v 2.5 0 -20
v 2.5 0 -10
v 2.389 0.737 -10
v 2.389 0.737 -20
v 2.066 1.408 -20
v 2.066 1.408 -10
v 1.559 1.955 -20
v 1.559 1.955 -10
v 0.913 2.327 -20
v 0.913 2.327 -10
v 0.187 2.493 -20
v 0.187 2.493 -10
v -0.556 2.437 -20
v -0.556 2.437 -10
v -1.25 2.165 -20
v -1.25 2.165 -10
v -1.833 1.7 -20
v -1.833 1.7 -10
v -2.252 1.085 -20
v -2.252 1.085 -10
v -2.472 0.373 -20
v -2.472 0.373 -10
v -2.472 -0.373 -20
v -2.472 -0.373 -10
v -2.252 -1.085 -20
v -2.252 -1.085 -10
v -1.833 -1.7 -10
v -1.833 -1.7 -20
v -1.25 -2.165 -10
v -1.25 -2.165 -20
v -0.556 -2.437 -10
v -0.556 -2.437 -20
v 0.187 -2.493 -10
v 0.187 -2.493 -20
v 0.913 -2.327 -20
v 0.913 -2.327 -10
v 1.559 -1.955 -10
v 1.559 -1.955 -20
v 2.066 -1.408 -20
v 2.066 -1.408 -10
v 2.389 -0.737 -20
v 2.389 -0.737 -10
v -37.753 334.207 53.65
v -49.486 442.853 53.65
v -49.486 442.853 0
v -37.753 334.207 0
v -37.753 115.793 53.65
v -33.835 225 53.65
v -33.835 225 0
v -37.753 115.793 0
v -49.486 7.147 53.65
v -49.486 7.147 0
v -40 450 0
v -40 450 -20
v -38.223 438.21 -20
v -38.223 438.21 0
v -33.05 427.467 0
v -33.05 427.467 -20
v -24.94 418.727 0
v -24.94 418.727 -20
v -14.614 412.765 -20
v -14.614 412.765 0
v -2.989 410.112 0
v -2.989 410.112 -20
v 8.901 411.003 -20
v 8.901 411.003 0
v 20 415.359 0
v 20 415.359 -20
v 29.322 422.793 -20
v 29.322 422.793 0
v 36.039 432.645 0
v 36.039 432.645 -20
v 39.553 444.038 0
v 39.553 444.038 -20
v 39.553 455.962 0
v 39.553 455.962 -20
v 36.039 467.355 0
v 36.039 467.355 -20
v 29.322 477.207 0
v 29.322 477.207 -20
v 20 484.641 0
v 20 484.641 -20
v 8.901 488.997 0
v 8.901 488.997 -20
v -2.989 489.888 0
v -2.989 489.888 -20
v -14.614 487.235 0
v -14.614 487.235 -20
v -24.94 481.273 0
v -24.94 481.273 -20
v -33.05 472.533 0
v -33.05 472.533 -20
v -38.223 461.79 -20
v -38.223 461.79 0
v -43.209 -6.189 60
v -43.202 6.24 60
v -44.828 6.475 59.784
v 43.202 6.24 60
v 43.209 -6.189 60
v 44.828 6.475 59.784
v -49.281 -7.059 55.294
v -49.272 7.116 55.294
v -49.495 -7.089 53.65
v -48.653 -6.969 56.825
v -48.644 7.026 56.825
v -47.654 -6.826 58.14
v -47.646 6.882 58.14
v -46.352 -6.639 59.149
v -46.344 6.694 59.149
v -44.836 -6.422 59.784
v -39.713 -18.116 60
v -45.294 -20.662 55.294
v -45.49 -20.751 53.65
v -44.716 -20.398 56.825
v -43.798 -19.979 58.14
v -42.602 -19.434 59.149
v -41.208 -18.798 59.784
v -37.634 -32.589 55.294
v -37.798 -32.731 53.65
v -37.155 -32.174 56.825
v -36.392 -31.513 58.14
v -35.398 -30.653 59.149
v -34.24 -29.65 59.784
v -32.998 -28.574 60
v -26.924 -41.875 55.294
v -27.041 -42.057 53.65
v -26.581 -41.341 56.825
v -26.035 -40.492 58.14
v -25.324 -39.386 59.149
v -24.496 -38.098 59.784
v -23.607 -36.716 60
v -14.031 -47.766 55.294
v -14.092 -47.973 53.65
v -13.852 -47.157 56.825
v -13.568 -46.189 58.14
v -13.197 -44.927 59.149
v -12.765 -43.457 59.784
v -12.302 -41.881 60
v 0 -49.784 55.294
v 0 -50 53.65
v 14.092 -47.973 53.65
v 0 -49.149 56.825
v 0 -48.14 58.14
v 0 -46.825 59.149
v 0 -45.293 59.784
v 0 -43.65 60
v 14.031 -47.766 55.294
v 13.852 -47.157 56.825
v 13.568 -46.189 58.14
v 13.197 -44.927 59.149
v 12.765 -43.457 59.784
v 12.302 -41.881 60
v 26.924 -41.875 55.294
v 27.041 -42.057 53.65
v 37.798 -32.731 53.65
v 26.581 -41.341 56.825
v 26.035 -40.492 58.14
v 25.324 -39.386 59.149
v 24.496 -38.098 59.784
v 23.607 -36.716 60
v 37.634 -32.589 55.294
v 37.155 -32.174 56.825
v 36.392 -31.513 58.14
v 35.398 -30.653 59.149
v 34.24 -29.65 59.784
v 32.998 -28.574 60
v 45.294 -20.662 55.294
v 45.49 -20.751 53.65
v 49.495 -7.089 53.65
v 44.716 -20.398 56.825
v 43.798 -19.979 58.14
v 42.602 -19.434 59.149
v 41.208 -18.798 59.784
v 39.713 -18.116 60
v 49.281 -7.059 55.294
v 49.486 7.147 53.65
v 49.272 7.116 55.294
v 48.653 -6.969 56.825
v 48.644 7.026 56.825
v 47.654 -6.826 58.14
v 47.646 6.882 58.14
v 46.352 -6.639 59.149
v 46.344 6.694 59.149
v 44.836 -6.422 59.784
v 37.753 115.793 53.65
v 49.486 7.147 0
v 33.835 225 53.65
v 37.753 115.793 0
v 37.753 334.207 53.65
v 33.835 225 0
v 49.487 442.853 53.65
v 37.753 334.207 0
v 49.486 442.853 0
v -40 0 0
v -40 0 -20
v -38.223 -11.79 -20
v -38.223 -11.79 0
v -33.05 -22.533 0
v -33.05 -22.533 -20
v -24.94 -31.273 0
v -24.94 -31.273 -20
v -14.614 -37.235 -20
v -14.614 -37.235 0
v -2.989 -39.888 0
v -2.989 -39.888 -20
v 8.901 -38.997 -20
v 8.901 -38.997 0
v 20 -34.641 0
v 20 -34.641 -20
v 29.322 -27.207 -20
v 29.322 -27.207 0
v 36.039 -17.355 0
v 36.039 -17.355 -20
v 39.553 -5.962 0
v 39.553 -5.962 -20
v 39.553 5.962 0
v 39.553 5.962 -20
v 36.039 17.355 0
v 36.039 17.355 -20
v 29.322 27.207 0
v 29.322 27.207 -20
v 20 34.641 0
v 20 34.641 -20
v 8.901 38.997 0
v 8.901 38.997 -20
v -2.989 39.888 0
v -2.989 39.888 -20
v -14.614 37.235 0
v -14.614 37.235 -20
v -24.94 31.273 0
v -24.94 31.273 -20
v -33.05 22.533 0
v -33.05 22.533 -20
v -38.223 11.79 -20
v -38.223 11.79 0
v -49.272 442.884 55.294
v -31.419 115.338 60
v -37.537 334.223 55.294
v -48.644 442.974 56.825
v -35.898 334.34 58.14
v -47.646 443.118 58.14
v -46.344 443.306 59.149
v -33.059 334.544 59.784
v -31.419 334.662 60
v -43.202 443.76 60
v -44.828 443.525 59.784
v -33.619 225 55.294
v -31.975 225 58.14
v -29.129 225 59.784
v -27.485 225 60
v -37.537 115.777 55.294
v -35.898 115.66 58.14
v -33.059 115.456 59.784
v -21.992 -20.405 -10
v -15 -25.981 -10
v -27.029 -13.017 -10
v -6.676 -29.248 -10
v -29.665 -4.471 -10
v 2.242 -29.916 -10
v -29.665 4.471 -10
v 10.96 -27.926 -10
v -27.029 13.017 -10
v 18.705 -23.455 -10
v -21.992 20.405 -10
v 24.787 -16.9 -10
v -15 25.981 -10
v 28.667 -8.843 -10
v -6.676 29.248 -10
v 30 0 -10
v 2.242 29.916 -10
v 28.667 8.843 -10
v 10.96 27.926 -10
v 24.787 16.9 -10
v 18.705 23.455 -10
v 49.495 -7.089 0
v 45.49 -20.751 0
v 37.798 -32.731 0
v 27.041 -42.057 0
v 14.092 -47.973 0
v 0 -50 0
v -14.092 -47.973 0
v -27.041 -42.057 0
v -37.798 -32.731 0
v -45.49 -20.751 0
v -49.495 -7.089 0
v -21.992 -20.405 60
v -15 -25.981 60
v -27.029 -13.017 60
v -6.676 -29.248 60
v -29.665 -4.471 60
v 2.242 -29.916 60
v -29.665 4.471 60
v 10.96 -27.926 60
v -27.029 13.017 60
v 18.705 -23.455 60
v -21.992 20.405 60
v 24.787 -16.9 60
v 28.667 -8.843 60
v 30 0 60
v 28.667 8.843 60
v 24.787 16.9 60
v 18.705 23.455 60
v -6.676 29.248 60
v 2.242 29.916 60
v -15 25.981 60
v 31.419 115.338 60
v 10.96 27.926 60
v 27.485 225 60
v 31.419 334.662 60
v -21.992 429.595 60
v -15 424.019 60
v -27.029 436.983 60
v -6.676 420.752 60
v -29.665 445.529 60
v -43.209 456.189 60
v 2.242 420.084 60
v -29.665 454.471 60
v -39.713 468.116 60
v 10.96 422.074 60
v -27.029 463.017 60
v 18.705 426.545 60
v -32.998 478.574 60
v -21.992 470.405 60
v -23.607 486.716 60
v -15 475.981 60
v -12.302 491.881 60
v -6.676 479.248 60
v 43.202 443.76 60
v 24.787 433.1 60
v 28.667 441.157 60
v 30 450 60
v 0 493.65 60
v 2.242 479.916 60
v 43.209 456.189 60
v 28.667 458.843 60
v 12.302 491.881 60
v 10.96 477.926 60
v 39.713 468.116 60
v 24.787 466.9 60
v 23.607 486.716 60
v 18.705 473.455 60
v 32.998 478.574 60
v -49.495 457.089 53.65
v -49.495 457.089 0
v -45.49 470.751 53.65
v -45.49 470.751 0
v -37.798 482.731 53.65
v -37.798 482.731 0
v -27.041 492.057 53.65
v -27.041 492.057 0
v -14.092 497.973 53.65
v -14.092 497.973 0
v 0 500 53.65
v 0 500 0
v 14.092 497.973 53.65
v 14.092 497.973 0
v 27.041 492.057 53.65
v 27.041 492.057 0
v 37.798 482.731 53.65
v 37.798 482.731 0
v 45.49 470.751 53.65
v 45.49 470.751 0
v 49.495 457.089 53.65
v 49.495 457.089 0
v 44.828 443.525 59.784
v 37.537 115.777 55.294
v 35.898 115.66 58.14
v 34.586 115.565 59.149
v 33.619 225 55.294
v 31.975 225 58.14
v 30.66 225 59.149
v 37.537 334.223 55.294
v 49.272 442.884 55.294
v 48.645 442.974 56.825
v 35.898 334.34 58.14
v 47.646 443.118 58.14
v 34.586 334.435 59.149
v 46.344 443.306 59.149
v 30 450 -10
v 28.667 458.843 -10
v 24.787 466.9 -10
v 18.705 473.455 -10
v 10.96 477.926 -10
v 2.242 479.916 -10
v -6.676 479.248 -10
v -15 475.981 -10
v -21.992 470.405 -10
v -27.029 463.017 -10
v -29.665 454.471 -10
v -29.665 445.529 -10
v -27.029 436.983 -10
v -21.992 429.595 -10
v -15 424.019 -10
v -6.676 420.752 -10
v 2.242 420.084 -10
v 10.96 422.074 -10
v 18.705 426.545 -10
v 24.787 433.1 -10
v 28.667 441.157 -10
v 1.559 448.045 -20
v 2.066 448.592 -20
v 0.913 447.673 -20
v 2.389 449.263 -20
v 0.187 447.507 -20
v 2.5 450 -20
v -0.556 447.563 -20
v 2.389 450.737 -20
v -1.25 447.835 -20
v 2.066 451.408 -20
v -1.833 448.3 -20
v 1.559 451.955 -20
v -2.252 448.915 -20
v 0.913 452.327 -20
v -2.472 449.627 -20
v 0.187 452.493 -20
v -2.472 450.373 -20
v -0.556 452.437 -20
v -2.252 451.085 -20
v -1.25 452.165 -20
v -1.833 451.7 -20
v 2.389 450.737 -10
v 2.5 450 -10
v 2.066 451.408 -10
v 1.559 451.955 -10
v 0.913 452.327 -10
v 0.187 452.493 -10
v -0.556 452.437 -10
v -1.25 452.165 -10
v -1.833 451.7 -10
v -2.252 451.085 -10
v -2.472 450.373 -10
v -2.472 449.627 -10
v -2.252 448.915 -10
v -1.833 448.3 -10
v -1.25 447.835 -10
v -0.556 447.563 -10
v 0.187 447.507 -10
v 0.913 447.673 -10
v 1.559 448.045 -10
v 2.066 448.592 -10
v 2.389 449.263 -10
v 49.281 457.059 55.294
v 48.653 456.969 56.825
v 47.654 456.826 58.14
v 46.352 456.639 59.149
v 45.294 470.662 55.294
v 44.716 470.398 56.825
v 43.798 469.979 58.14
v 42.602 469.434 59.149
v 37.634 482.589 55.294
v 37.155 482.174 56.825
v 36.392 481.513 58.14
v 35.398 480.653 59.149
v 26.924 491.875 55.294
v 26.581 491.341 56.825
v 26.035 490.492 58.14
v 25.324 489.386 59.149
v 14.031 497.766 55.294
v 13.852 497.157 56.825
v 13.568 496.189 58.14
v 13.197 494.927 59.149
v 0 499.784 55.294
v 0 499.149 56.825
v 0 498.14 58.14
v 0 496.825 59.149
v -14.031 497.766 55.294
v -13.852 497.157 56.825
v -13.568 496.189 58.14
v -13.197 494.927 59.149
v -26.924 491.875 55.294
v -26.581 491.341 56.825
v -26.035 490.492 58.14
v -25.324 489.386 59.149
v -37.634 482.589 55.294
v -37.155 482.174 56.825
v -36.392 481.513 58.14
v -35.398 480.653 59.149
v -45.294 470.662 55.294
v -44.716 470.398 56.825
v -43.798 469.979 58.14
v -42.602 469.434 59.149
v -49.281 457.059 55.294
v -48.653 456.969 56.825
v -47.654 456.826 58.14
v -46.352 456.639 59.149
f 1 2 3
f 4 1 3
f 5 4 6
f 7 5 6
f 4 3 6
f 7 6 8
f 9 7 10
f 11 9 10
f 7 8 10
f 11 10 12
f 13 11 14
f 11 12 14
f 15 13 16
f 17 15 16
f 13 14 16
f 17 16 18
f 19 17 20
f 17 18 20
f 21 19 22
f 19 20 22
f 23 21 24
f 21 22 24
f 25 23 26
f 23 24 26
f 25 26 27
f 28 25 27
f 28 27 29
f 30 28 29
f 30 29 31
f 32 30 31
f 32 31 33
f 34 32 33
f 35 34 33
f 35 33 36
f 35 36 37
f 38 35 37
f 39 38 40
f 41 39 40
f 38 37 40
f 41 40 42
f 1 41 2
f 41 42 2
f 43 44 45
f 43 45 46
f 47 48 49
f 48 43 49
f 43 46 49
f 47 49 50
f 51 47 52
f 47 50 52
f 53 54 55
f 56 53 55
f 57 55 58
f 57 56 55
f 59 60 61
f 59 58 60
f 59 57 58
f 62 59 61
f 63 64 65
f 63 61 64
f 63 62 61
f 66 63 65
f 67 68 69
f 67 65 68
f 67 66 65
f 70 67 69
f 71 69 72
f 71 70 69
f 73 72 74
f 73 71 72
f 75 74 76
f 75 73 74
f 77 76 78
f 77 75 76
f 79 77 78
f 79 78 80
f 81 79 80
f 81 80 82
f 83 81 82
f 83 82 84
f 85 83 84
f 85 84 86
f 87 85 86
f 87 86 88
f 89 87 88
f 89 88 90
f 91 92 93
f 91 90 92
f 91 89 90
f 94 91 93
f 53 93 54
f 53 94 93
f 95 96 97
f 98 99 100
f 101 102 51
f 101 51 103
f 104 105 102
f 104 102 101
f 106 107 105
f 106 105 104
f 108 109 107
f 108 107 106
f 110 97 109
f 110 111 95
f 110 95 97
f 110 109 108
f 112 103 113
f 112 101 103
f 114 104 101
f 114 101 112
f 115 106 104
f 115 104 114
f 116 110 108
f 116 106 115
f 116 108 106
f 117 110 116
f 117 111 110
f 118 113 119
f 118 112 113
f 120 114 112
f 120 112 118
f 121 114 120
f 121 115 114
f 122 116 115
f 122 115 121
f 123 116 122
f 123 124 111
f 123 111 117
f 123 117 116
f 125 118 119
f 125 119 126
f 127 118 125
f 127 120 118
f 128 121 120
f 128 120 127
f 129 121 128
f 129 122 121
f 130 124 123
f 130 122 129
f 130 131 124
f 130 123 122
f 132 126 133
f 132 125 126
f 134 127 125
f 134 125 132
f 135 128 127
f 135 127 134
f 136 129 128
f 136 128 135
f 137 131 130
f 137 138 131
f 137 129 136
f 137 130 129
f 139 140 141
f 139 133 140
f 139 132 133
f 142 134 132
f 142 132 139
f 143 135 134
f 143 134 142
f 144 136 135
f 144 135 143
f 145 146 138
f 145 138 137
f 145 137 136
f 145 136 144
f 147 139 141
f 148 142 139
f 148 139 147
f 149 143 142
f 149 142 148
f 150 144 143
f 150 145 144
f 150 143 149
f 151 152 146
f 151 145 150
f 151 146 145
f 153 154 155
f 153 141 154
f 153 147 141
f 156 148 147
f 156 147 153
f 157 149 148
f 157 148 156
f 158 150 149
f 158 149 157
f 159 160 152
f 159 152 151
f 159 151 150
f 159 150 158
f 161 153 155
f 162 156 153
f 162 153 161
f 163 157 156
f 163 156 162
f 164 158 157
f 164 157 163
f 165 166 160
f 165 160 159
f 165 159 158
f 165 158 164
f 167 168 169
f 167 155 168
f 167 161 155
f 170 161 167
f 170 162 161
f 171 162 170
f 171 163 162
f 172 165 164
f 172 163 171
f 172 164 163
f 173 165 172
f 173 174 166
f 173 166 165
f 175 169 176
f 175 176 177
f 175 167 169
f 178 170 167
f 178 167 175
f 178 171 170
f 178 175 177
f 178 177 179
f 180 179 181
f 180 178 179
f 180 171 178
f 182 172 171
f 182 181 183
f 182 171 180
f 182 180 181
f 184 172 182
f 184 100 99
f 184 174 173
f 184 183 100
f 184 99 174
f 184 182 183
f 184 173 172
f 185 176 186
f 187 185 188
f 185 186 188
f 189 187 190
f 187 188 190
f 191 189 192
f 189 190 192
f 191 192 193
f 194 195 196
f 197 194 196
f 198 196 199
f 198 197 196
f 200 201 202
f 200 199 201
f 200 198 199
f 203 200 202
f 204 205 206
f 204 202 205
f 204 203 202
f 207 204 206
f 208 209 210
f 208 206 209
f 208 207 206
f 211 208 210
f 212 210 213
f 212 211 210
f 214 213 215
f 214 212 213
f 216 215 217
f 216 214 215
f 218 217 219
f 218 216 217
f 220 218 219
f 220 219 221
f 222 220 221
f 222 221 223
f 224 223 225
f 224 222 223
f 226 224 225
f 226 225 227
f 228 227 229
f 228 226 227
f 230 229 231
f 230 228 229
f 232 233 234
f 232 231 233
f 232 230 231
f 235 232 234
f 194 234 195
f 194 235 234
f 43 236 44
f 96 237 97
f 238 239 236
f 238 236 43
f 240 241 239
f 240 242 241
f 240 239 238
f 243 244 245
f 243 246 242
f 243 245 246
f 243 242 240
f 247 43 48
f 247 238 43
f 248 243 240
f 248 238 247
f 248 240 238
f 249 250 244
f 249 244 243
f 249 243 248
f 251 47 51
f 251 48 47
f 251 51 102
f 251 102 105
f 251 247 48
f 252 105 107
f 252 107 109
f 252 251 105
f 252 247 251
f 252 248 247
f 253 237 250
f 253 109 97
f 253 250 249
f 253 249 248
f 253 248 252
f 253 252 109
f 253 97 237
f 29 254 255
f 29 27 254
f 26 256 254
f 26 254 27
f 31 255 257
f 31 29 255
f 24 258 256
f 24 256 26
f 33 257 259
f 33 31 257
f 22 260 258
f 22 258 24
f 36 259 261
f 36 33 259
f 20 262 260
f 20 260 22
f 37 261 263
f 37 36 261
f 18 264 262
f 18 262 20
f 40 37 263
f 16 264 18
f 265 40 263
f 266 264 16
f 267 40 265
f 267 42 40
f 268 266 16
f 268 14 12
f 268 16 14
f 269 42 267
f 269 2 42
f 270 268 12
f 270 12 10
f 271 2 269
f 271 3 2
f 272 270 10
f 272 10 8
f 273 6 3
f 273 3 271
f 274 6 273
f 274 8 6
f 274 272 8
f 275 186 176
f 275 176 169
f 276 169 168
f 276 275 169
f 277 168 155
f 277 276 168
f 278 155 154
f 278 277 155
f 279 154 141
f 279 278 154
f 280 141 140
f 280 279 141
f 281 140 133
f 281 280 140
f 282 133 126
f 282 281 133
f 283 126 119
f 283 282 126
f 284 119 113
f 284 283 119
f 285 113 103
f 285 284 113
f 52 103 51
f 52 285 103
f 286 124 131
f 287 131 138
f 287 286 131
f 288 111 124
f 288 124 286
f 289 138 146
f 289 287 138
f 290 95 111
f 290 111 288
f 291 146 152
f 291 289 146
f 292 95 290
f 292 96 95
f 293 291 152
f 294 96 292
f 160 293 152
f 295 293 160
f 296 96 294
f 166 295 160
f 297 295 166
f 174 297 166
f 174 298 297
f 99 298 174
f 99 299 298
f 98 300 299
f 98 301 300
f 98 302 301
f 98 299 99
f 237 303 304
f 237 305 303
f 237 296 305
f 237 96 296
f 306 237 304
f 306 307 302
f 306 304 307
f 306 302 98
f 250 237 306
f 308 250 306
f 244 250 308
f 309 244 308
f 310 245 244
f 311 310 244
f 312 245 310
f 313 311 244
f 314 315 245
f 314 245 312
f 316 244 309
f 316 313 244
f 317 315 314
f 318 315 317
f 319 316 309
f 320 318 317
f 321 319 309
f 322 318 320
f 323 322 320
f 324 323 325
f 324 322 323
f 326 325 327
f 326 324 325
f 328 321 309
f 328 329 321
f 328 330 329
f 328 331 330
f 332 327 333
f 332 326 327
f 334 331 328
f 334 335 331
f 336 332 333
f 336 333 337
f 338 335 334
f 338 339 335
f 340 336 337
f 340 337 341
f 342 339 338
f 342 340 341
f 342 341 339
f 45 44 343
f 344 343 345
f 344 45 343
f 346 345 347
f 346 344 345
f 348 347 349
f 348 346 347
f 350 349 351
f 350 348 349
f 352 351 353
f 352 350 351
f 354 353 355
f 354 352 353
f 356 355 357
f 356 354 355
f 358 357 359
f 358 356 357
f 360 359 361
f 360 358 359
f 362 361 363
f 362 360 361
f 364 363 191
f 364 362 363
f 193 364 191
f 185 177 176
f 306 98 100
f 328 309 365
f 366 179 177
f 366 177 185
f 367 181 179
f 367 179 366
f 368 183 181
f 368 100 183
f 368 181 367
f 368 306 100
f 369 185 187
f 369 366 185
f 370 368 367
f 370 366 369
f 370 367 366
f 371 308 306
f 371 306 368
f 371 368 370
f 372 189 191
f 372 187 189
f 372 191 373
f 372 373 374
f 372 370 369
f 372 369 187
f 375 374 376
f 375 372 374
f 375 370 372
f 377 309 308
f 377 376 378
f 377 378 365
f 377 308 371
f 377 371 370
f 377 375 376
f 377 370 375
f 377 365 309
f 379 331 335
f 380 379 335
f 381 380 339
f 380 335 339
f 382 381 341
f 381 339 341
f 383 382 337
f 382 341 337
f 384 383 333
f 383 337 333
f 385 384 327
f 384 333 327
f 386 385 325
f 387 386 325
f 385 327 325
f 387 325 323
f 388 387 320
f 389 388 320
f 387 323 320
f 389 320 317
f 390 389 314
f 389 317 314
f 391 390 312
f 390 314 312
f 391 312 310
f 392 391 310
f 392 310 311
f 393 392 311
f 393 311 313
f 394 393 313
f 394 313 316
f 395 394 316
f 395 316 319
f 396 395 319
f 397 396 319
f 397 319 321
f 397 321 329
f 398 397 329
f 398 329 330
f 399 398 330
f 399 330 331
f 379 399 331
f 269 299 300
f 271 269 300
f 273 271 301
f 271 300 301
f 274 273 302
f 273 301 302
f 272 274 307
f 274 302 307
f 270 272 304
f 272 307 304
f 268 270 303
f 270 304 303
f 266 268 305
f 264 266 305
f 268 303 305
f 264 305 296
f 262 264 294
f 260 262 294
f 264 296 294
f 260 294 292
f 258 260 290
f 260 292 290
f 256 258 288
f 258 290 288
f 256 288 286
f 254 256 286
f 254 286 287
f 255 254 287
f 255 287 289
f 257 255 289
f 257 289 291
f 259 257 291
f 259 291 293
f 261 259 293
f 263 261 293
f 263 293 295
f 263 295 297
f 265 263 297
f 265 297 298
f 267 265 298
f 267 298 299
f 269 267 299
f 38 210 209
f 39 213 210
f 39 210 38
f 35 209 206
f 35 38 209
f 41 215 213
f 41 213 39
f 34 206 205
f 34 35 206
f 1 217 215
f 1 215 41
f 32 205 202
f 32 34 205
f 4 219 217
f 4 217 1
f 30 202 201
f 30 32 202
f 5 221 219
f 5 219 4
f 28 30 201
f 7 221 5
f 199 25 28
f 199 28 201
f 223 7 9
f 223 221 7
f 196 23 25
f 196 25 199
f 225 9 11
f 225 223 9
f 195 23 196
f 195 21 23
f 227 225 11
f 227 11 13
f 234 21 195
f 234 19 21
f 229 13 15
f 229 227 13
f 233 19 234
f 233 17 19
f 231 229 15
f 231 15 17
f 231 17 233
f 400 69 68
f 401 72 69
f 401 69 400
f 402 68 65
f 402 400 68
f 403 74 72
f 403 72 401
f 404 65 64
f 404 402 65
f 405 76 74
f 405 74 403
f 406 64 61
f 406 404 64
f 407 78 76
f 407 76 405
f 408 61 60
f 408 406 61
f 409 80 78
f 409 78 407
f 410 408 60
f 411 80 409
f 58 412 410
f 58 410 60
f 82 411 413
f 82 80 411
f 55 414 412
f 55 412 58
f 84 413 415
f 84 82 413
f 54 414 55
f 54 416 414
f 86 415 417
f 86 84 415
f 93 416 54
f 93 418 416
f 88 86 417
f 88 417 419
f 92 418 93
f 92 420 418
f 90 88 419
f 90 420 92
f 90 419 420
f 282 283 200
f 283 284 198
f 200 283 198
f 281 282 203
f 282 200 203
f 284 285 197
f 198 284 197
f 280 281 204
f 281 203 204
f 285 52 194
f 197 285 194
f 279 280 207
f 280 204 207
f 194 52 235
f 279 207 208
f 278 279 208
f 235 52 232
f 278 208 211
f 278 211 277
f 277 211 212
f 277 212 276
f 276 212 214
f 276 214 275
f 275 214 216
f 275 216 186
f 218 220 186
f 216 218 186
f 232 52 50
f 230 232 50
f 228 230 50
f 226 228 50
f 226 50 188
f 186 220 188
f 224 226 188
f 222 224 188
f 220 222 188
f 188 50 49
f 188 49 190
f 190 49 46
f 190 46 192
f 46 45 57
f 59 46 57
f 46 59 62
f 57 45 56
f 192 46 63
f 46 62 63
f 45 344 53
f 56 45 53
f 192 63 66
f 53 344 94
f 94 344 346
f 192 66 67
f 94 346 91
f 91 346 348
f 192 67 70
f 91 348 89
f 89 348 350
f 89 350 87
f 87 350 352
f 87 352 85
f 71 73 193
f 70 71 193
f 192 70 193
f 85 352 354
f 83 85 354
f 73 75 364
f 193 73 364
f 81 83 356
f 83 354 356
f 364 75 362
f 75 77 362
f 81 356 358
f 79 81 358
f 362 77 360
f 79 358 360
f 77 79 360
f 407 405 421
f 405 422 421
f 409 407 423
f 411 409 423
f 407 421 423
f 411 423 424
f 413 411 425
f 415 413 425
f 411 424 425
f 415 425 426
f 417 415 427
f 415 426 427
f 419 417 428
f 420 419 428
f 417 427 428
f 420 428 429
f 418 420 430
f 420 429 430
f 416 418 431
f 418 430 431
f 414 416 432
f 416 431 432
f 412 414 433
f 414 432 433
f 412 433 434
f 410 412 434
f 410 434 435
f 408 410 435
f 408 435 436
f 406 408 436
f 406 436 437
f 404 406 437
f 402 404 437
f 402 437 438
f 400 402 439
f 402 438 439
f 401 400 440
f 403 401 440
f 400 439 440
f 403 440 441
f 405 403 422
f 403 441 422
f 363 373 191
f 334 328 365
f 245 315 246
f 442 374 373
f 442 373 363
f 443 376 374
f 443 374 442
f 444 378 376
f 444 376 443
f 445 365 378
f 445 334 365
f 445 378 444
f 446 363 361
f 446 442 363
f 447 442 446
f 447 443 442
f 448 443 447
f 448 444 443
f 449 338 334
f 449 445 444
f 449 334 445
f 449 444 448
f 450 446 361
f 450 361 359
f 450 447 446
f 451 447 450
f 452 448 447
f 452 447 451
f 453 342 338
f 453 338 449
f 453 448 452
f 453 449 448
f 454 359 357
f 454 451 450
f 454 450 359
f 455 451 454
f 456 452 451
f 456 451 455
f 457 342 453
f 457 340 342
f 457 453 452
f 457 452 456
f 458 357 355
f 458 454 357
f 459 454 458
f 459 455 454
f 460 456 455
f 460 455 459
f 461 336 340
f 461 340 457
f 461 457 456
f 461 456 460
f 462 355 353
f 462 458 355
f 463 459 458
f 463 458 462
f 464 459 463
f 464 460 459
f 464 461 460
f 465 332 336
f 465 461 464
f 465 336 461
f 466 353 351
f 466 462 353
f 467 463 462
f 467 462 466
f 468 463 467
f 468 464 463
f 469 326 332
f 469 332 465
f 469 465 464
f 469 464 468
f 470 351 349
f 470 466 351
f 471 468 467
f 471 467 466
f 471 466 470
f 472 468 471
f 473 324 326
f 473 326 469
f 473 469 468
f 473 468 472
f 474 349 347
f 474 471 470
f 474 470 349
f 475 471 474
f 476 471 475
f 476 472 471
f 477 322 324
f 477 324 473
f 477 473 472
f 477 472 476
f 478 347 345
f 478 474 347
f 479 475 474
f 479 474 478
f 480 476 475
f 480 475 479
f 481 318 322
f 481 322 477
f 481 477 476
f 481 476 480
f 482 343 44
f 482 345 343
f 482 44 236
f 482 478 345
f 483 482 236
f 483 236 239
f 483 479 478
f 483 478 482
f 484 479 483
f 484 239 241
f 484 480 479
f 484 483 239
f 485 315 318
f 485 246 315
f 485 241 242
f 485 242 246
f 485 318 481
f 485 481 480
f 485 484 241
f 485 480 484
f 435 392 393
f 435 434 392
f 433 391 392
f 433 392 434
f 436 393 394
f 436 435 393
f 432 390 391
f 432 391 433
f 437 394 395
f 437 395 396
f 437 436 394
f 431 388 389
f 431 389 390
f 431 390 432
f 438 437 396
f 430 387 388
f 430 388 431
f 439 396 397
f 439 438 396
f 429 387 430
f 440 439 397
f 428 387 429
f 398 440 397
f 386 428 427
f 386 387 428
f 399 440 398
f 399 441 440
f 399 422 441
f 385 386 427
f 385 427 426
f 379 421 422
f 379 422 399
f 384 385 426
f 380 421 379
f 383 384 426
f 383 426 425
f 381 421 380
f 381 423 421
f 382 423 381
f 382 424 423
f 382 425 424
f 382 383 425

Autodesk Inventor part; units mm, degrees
ref_plane "YZ Plane" through (0, 0, 0) normal (1, 0, 0) x (0, 1, 0)
ref_plane "XZ Plane" through (0, 0, 0) normal (0, 1, 0) x (-1, 0, 0)
ref_plane "XY Plane" through (0, 0, 0) normal (0, 0, 1) x (1, 0, 0)
sketch "Sketch1" plane through (0, 0, 0) normal (0, 0, 1) x (1, 0, 0)
  circle A0 centre (0, 0) radius 50
  circle A1 centre (0, 450) radius 50
  arc A2 (49.4865, 442.8526) -> (49.4865, 7.1474) centre (1557.8354, 225) ccw
  arc A3 (-49.4865, 7.1474) -> (-49.4865, 442.8526) centre (-1557.8354, 225) ccw
  dimension "d0" = 100
  dimension "d1" = 450
  dimension "d2" = 1524
extrude "Extrusion1" add sketch "Sketch1" along normal blind 60
fillet "Fillet1" radius 6.35 4 edges at (-33.8354, 225, 60) (0, -50, 60) (33.8354, 225, 60) (0, 500, 60)
sketch "Sketch2" plane through (0, 0, 0) normal (0, 0, -1) x (-1, 0, 0)
  circle A0 centre (0, 450) radius 40
  circle A1 centre (0, 0) radius 40
  arc A2 (49.4865, 442.8526) -> (49.4865, 7.1474) centre (1557.8354, 225) ccw projected
  arc A3 (49.4865, 442.8526) -> (-49.4865, 442.8526) centre (0, 450) ccw projected
  arc A4 (-49.4865, 7.1474) -> (-49.4865, 442.8526) centre (-1557.8354, 225) ccw projected
  arc A5 (-49.4865, 7.1474) -> (49.4865, 7.1474) centre (0, 0) ccw projected
  dimension "d6" = 80
extrude "Extrusion2" add sketch "Sketch2" along normal blind 20 contours A0 | A1
sketch "Sketch3" plane through (0, 0, 60) normal (0, 0, 1) x (1, 0, 0)
  circle A0 centre (0, 0) radius 30
  arc A1 (-43.2017, 6.2397) -> (-43.2017, 443.7603) centre (-1557.8354, 225) ccw projected
  arc A2 (-43.2017, 6.2397) -> (43.2017, 6.2397) centre (0, 0) ccw projected
  arc A3 (43.2017, 443.7603) -> (43.2017, 6.2397) centre (1557.8354, 225) ccw projected
  arc A4 (43.2017, 443.7603) -> (-43.2017, 443.7603) centre (0, 450) ccw projected
  circle A5 centre (0, 450) radius 30
  dimension "d9" = 60
extrude "Extrusion3" cut sketch "Sketch3" against normal blind 70 contours A0 | A5
sketch "Sketch4" plane through (0, 450, -10) normal (0, 0, 1) x (1, 0, 0)
  circle A0 centre (0, 0) radius 30 projected
  circle A1 centre (0, -450) radius 30 projected
  circle A2 centre (0, 0) radius 2.5
  circle A3 centre (0, -450) radius 2.5
  dimension "d12" = 5
extrude "Extrusion4" cut sketch "Sketch4" against normal through all contours A2 | A3
properties part number "Robot_arm_1"
